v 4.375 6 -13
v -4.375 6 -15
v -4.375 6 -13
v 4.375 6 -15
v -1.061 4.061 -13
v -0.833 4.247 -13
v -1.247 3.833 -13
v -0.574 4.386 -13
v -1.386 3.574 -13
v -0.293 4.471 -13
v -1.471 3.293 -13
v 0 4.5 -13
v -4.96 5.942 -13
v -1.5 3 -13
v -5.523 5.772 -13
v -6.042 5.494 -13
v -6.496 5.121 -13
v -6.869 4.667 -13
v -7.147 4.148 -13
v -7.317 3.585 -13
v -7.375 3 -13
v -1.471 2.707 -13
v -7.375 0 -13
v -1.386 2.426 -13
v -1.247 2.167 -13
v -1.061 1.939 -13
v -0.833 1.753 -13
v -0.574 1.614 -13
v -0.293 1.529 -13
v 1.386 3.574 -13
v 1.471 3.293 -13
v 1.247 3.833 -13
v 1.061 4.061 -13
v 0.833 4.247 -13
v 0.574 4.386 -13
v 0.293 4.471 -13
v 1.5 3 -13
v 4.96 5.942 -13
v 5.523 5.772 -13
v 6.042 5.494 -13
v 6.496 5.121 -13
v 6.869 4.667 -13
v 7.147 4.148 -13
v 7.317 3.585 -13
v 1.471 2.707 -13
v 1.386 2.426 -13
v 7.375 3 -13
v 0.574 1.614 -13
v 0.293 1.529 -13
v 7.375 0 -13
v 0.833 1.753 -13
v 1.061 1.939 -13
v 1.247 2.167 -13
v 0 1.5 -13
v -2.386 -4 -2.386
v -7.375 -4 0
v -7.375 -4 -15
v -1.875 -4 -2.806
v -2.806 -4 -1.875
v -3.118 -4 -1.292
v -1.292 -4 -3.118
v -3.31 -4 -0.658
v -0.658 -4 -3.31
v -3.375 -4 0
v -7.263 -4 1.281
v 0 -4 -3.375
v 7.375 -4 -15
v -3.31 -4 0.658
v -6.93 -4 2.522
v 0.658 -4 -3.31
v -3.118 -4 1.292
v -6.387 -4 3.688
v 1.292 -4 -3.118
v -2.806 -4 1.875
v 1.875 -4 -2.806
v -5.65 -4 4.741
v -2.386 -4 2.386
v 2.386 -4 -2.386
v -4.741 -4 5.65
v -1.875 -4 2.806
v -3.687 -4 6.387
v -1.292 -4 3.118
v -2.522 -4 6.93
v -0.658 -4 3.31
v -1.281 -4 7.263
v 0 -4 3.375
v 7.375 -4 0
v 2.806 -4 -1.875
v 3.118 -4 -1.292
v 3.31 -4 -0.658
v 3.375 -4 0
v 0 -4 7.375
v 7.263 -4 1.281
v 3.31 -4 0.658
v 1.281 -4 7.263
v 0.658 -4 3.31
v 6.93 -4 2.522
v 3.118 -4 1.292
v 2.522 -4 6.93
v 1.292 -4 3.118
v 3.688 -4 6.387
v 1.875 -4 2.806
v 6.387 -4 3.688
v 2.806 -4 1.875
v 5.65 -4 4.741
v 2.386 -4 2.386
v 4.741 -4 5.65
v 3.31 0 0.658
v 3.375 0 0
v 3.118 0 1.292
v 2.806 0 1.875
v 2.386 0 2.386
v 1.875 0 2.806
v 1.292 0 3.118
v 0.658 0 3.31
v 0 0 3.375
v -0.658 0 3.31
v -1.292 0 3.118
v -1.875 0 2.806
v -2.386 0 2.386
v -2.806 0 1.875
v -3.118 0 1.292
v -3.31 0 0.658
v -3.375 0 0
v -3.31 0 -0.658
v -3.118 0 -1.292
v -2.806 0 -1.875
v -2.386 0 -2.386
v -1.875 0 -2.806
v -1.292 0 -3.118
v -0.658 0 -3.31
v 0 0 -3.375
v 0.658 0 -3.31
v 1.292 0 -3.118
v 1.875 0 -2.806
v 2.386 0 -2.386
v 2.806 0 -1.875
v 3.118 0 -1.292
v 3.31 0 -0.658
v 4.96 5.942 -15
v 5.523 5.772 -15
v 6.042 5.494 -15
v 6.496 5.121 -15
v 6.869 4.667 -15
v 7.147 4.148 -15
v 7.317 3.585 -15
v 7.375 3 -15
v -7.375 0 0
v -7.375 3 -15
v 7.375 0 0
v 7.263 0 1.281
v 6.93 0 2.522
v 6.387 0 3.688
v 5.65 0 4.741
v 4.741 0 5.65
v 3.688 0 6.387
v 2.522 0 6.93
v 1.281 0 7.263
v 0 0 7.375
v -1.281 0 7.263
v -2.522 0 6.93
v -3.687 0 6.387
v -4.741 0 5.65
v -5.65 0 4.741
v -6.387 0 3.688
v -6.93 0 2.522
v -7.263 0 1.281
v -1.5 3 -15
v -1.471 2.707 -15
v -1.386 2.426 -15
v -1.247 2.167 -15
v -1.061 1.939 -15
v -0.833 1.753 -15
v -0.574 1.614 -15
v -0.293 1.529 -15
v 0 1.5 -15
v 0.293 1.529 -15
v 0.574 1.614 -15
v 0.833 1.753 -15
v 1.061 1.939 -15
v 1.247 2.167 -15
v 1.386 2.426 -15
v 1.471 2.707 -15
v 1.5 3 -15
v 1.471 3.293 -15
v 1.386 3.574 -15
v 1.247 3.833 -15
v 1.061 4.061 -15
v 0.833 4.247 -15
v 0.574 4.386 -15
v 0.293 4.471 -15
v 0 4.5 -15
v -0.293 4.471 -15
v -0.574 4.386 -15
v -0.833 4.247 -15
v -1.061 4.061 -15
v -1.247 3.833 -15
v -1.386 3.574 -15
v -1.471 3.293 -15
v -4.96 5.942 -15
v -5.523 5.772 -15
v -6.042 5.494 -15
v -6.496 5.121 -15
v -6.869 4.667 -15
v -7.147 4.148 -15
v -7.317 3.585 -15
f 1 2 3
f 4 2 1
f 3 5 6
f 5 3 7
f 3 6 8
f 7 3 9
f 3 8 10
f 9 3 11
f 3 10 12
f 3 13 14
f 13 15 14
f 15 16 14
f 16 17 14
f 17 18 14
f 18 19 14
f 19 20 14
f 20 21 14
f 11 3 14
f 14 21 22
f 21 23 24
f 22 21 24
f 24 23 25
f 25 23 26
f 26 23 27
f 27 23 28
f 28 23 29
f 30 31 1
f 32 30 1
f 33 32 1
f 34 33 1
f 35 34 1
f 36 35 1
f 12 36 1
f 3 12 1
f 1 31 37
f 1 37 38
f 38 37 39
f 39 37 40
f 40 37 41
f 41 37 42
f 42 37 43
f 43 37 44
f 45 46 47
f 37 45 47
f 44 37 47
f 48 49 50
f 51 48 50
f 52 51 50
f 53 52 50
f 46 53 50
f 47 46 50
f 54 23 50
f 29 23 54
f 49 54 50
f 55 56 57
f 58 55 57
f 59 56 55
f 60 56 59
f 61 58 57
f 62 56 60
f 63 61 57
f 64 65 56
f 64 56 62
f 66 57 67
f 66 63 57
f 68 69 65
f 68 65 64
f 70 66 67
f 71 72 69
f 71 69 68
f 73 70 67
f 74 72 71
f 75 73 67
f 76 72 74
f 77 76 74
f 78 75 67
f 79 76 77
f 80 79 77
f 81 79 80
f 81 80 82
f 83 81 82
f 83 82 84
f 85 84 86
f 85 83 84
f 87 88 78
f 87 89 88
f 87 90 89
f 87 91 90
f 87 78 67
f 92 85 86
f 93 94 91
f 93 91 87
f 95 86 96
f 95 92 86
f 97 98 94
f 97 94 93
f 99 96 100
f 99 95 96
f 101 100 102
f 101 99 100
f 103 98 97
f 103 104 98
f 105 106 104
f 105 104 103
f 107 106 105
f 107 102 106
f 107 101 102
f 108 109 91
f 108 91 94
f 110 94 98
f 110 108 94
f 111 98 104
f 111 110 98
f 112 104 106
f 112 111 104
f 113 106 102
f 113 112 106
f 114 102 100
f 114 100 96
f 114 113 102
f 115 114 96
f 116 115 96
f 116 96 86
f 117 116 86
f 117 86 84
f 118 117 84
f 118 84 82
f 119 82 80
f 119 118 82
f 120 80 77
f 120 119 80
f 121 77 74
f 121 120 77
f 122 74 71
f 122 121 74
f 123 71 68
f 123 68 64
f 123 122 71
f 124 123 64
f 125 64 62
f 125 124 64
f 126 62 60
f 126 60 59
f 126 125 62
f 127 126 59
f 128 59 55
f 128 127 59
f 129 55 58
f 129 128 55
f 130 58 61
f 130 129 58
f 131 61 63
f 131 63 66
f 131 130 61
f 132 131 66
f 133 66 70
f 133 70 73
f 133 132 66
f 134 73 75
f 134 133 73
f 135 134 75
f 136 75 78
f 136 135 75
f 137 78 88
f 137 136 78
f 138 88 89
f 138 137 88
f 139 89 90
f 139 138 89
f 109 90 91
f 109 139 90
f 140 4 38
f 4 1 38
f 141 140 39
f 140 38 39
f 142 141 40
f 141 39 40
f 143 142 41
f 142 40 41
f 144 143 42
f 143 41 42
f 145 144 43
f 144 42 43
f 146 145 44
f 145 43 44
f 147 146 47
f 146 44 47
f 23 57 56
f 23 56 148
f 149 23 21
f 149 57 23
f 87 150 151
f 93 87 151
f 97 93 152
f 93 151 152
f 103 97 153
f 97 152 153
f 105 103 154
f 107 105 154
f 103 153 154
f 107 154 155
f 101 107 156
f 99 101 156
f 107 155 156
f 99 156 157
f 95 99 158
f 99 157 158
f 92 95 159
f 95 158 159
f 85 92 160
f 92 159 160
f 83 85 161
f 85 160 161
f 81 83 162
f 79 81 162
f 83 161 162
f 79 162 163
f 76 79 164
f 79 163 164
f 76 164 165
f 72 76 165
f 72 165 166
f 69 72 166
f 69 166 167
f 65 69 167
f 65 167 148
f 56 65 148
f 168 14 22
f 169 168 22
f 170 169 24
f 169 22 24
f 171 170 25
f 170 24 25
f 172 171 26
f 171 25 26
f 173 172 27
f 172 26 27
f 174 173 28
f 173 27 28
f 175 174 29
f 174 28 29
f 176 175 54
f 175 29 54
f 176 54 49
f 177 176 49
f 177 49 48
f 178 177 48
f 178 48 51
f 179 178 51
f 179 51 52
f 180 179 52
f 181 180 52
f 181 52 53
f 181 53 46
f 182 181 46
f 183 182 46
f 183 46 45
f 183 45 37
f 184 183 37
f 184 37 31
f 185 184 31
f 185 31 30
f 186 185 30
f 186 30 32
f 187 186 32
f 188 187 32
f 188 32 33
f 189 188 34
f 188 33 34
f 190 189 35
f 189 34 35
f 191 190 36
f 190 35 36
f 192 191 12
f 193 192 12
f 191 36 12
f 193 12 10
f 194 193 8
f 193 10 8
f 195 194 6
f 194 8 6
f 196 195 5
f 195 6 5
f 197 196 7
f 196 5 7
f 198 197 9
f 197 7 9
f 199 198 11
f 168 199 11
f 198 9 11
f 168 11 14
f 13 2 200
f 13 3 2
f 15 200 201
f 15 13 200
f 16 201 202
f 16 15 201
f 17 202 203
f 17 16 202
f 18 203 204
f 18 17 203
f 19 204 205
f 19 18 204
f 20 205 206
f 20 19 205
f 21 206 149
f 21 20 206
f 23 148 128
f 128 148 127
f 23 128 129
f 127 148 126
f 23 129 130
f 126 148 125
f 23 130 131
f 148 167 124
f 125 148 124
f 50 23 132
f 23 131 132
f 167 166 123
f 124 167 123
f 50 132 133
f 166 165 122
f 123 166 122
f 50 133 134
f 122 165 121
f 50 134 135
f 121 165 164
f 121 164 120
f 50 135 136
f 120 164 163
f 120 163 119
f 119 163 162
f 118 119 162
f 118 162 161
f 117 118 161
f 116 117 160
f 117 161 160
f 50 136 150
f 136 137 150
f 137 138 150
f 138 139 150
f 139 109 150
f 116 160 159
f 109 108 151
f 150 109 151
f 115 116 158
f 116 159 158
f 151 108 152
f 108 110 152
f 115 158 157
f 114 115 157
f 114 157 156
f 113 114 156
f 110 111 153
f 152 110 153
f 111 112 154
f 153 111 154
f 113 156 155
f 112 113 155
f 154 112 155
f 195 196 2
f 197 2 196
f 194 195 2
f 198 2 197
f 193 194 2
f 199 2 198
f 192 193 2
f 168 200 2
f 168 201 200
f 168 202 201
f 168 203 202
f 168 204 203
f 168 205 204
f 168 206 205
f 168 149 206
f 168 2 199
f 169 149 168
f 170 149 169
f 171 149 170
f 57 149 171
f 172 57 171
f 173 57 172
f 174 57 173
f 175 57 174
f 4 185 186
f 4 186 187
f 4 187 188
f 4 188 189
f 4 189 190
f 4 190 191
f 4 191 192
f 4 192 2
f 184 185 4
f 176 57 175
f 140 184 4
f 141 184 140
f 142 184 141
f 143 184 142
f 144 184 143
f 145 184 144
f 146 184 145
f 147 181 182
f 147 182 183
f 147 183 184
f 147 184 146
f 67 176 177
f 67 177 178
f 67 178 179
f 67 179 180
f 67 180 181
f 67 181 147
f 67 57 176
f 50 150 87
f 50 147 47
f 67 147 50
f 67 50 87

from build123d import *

# Parameters (mm, degrees)
F0_R     = 3.375
F1_DEPTH = 4
F2_W     = 14.75
F2_H     = 6
F2_H_2   = 4
F3_DEPTH = 2
F4_R     = 3
F5_D     = 3


# Not quite as in the source:
# - a feature names something its author has since deleted; it is built from what else it names


with BuildPart() as f1:
    # F0 (on Front) → F1 (new body)
    with BuildSketch(Plane.XZ):
        with BuildLine():
            Line((7.375, -15), (7.375, 0))
            ThreePointArc((7.375, 0), (0, -7.375), (-7.375, 0))
            Line((-7.375, 0), (-7.375, -15))
            Line((-7.375, -15), (7.375, -15))
        make_face()
        with BuildLine():
            ThreePointArc((-7.375, 0), (0, -7.375), (7.375, 0))
            ThreePointArc((7.375, 0), (0, 7.375), (-7.375, 0))
        make_face()
        Circle(F0_R, mode=Mode.SUBTRACT)
    extrude(amount=F1_DEPTH)

    # F2 (on face) → F3 (join)
    with BuildSketch(Plane(origin=(0, 0, -15), x_dir=(1, 0, 0), z_dir=(0, 0, -1))):
        with Locations((0, -3)):
            Rectangle(F2_W, F2_H)
        with Locations((0, 2)):
            Rectangle(F2_W, F2_H_2)
    extrude(amount=-F3_DEPTH)

    # F4
    f4_edges = [f1.edges().sort_by_distance(p)[0] for p in [
        (-7.375, 6, -14),
        (7.375, 6, -14),
    ]]
    fillet(f4_edges, radius=F4_R)

    # F5 (through all)
    with Locations(Plane(origin=(0, 0, -15), x_dir=(1, 0, 0), z_dir=(0, 0, -1))):
        with Locations((0, -3)):
            Hole(F5_D / 2)


solid = f1.part
